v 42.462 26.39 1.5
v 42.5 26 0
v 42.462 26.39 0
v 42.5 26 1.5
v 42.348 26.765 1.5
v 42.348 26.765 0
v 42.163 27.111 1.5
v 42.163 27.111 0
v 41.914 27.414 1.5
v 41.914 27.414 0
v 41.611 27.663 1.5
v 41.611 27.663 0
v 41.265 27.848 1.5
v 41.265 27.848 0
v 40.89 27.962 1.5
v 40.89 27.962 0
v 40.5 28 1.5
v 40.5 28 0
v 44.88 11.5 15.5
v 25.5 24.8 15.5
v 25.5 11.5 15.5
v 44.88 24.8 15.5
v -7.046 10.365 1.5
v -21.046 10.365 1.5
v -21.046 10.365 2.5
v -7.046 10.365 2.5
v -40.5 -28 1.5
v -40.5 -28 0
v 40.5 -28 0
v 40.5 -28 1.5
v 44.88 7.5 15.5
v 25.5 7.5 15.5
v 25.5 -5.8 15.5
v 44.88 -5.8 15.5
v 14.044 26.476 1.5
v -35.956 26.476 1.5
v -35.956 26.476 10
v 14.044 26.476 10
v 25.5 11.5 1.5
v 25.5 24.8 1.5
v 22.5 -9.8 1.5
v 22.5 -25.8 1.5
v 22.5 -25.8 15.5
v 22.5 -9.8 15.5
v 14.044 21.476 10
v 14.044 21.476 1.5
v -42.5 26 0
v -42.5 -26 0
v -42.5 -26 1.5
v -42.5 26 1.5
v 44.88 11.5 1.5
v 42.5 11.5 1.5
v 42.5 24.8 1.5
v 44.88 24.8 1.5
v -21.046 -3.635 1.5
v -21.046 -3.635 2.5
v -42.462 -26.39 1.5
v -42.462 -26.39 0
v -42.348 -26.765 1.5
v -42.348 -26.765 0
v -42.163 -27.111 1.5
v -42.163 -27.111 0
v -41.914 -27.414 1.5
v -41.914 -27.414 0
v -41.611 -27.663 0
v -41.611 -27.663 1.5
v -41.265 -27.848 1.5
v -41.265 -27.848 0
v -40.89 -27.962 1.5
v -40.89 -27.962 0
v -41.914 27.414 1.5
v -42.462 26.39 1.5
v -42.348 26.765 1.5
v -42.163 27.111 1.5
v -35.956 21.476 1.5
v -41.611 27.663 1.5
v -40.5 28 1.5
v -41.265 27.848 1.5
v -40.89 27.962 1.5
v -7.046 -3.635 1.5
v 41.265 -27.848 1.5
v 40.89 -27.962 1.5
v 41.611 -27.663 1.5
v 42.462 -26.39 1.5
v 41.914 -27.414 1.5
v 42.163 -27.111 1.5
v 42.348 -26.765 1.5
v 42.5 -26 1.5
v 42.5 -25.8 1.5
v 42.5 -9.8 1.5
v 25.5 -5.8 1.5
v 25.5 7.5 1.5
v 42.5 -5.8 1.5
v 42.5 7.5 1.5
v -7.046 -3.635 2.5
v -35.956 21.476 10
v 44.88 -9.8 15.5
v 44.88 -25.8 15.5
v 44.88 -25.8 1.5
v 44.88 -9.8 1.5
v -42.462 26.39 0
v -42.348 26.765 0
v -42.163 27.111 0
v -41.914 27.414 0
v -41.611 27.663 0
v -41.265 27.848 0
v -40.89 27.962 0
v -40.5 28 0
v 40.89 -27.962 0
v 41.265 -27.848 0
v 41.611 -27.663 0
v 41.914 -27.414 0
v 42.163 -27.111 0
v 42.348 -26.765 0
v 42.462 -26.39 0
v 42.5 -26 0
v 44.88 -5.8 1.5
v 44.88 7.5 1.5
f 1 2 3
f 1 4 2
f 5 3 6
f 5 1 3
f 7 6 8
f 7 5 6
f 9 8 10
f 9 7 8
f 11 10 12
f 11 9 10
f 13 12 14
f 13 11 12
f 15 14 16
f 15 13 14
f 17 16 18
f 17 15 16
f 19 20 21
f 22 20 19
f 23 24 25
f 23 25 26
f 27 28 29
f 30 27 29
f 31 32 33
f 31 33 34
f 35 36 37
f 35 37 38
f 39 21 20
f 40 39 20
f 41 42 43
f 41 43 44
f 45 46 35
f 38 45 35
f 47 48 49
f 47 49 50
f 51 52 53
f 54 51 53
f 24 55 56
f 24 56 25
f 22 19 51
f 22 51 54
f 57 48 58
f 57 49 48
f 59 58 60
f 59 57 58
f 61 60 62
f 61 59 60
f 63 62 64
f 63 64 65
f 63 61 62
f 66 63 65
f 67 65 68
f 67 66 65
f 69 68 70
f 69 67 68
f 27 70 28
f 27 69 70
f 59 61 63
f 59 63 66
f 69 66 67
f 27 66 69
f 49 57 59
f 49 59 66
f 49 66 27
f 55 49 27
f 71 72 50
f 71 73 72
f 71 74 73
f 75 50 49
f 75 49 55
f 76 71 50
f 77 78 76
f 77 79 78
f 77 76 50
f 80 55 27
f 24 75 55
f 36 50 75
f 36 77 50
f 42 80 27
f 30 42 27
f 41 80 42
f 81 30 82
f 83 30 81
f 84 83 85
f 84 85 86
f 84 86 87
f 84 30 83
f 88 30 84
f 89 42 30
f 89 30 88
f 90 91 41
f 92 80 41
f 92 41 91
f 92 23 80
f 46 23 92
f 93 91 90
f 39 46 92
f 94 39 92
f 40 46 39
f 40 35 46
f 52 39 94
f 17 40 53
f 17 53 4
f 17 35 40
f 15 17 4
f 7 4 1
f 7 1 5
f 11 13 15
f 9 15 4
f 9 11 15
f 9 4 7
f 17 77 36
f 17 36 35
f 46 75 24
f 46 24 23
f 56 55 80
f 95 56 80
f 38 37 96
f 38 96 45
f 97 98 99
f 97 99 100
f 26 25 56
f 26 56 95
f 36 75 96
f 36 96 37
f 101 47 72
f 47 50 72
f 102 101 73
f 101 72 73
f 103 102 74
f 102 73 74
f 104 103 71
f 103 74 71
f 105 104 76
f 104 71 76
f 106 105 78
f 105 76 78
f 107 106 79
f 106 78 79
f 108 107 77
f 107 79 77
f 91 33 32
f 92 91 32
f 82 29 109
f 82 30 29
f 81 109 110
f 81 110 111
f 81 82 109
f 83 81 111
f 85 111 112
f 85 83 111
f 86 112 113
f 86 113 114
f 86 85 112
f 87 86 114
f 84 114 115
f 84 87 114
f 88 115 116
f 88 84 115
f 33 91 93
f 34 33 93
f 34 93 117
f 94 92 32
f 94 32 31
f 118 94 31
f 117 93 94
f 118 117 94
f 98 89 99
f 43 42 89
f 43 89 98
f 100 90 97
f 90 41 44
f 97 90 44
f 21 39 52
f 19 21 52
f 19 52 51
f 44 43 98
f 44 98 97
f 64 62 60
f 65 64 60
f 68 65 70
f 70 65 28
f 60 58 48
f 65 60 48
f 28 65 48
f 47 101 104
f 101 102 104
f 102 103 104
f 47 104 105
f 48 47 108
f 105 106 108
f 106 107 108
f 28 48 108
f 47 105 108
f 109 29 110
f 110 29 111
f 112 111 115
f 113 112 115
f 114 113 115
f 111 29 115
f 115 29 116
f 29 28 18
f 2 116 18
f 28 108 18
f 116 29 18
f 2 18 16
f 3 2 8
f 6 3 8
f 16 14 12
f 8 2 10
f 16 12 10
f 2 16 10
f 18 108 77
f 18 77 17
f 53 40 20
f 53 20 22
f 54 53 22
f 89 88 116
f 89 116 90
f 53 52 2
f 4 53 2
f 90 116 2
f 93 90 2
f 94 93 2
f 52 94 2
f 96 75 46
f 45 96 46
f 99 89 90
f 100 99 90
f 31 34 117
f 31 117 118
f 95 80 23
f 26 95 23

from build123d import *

# Parameters (mm, degrees)
F0_W      = 85
F0_H      = 56
F1_DEPTH  = 1.5
F2_R      = 2
F3_W      = 50
F3_H      = 5
F4_DEPTH  = 8.5
F5_W      = 17
F5_H      = 13.3
F5_W_2    = 20
F5_H_2    = 16
F6_DEPTH  = 14
F7_W      = 16
F7_H      = 14
F7_W_2    = 13.3
F8_DEPTH  = 2.38
F9_W      = 14
F9_H      = 14
F10_DEPTH = 1


with BuildPart() as f1:
    # F0 (on Top) → F1 (new body)
    with BuildSketch(Plane.XY):
        Rectangle(F0_W, F0_H)
    extrude(amount=F1_DEPTH)

    # F2
    f2_edges = [f1.edges().sort_by_distance(p)[0] for p in [
        (-42.5, -28, 0.75),
        (-42.5, 28, 0.75),
        (42.5, -28, 0.75),
        (42.5, 28, 0.75),
    ]]
    fillet(f2_edges, radius=F2_R)

    # F3 (on face) → F4 (join)
    with BuildSketch(Plane.XY.offset(1.5)):
        with Locations((-10.955842, 23.976474)):
            Rectangle(F3_W, F3_H)
    extrude(amount=F4_DEPTH)

    # F5 (on face) → F6 (join)
    with BuildSketch(Plane.XY.offset(1.5)):
        with Locations((34, 18.15)):
            Rectangle(F5_W, F5_H)
        with Locations((34, 0.85)):
            Rectangle(F5_W, F5_H)
        with Locations((32.5, -17.8)):
            Rectangle(F5_W_2, F5_H_2)
    extrude(amount=F6_DEPTH)

    # F7 (on face) → F8 (join)
    with BuildSketch(Plane.YZ.offset(42.5)):
        with Locations((-17.8, 8.5)):
            Rectangle(F7_W, F7_H)
        with Locations((0.85, 8.5)):
            Rectangle(F7_W_2, F7_H)
        with Locations((18.15, 8.5)):
            Rectangle(F7_W_2, F7_H)
    extrude(amount=F8_DEPTH)

    # F9 (on face) → F10 (join)
    with BuildSketch(Plane.XY.offset(1.5)):
        with Locations((-14.045779, 3.365002)):
            Rectangle(F9_W, F9_H)
    extrude(amount=F10_DEPTH)


solid = f1.part
